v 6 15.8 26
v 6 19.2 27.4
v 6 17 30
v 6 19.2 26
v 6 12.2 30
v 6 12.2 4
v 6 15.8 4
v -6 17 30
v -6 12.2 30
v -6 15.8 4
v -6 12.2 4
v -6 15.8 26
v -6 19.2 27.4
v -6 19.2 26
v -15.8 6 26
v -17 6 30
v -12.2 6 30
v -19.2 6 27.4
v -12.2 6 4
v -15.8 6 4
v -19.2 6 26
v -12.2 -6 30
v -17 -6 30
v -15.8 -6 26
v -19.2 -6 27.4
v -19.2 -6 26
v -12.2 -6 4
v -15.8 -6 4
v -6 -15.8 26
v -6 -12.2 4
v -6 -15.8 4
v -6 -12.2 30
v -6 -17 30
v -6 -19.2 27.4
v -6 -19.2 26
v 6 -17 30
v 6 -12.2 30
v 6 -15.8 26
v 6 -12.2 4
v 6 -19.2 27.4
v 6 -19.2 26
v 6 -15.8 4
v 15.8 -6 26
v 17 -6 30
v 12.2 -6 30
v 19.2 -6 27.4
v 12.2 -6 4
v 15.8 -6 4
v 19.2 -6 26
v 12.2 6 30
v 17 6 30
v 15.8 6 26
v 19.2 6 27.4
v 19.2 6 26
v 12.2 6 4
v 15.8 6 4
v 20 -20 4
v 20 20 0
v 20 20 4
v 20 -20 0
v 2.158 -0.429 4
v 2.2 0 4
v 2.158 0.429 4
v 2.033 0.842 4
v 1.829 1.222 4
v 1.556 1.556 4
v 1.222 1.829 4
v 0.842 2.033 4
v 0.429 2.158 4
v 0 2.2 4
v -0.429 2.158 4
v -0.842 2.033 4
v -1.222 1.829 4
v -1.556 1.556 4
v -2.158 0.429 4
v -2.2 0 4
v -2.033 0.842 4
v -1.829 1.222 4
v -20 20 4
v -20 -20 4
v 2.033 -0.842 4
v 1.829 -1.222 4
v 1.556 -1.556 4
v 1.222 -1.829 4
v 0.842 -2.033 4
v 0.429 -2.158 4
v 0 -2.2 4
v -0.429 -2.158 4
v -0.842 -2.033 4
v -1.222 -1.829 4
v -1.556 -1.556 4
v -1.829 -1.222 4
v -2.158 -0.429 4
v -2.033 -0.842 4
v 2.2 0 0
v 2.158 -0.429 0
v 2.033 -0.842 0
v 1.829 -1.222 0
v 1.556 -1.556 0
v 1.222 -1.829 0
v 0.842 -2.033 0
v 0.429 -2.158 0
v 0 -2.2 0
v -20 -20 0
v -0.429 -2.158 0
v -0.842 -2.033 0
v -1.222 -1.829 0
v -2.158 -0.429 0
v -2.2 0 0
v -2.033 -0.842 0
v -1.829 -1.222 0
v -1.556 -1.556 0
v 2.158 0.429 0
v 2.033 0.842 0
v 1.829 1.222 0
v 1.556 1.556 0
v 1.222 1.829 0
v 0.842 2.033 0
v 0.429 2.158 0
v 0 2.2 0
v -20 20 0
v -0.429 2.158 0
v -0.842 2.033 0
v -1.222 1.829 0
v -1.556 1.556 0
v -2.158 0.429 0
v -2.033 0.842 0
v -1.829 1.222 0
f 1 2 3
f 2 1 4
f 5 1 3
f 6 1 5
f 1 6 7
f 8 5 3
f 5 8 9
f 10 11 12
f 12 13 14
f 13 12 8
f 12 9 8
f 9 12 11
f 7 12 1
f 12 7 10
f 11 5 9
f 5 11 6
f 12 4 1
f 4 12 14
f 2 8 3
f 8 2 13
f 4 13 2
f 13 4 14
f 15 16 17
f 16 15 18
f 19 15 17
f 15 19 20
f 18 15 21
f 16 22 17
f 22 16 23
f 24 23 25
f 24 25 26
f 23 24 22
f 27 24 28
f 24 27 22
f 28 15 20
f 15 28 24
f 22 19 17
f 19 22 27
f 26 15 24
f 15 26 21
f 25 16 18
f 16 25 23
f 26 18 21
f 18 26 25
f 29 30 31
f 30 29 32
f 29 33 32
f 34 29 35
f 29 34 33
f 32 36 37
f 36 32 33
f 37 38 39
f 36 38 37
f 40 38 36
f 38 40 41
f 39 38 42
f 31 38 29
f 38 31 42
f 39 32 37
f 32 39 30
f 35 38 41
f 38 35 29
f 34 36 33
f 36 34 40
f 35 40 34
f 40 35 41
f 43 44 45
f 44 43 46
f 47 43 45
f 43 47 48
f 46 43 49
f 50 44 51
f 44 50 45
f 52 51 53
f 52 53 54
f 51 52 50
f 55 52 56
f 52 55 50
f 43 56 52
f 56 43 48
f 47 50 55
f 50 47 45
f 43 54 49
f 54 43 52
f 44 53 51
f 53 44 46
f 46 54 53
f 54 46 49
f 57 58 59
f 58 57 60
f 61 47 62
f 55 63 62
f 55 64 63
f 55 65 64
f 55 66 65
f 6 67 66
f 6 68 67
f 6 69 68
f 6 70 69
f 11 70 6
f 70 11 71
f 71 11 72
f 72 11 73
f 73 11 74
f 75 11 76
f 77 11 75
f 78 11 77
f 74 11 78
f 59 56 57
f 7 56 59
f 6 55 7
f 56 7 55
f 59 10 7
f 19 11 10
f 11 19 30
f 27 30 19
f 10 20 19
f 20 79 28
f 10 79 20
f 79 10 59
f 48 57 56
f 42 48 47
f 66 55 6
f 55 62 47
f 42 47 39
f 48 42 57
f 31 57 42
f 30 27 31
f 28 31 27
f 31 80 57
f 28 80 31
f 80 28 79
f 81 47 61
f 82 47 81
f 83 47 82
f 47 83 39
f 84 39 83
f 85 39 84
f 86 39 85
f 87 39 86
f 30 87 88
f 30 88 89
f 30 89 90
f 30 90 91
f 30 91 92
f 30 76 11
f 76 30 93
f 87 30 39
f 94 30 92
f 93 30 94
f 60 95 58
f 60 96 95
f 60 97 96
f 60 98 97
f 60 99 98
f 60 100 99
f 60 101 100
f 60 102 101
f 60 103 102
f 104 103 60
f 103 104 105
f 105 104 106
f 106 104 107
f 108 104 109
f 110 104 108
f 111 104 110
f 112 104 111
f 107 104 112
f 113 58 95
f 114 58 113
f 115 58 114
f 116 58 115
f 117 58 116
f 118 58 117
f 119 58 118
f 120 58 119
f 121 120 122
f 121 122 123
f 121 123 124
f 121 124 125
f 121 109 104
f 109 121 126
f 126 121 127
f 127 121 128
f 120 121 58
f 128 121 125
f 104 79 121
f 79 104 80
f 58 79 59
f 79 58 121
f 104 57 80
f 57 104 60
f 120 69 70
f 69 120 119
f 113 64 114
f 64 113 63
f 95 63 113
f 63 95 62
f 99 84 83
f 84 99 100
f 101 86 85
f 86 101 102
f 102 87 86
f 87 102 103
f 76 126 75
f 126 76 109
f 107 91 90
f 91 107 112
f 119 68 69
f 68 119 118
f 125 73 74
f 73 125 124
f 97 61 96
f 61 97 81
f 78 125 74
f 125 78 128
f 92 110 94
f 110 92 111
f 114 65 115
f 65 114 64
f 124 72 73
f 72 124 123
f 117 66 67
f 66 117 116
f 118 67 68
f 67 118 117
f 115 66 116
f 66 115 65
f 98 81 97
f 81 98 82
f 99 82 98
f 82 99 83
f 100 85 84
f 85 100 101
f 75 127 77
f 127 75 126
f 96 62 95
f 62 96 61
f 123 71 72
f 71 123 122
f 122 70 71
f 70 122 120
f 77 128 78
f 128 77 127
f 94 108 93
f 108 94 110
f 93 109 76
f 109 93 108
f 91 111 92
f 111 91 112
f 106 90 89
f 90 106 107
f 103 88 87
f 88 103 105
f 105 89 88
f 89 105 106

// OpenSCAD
$fn = 32;

// ----------------------------------------------------------------------
// Snap-fit latch: 4 arms, 26 mm tall, 3.6 mm undercut hooks
// ----------------------------------------------------------------------

// --- parameters (mm) ---
base_d = 40;              // base plate depth
base_h = 4;               // base plate thickness
span = 28;                // distance between opposite arms
arm_t = 3.6;              // arm thickness
arm_d = 12;               // arm width
height = 26;              // free arm length
head_len = 3.6;           // hook reach
head_h = 4;               // hook height
lead = 1.4;               // lead-in ramp thickness
bore_d = 4.4;             // base fixing bore
top_z = 30;               // height of the arm tips above the base

arms = 4;

difference() {
  union() {
    /* base plate, centred on the arm ring */
    translate([-20, -20, 0]) cube([base_d, base_d, base_h]);
    for (a = [0 : 360 / arms : 359]) rotate([0, 0, a]) {
    /* arm, sunk 0.5 mm into the base */
    translate([-arm_d / 2, span / 2 - arm_t / 2, base_h - 0.5]) cube([arm_d, arm_t, height + 0.5]);
    /* hook: a convex hull of a tall inner block and a thin outer lip
       gives a flat undercut below and a lead-in ramp on top */
    hull() {
      translate([-arm_d / 2, span / 2 + arm_t / 2 - 0.6, top_z - head_h]) cube([arm_d, lead + 0.4, head_h]);
      translate([-arm_d / 2, span / 2 + arm_t / 2 - 0.2, top_z - head_h]) cube([arm_d, head_len, lead]);
    }
    }
  }
  translate([0, 0, -2.5]) cylinder(h = base_h + 5, d = bore_d);
}
